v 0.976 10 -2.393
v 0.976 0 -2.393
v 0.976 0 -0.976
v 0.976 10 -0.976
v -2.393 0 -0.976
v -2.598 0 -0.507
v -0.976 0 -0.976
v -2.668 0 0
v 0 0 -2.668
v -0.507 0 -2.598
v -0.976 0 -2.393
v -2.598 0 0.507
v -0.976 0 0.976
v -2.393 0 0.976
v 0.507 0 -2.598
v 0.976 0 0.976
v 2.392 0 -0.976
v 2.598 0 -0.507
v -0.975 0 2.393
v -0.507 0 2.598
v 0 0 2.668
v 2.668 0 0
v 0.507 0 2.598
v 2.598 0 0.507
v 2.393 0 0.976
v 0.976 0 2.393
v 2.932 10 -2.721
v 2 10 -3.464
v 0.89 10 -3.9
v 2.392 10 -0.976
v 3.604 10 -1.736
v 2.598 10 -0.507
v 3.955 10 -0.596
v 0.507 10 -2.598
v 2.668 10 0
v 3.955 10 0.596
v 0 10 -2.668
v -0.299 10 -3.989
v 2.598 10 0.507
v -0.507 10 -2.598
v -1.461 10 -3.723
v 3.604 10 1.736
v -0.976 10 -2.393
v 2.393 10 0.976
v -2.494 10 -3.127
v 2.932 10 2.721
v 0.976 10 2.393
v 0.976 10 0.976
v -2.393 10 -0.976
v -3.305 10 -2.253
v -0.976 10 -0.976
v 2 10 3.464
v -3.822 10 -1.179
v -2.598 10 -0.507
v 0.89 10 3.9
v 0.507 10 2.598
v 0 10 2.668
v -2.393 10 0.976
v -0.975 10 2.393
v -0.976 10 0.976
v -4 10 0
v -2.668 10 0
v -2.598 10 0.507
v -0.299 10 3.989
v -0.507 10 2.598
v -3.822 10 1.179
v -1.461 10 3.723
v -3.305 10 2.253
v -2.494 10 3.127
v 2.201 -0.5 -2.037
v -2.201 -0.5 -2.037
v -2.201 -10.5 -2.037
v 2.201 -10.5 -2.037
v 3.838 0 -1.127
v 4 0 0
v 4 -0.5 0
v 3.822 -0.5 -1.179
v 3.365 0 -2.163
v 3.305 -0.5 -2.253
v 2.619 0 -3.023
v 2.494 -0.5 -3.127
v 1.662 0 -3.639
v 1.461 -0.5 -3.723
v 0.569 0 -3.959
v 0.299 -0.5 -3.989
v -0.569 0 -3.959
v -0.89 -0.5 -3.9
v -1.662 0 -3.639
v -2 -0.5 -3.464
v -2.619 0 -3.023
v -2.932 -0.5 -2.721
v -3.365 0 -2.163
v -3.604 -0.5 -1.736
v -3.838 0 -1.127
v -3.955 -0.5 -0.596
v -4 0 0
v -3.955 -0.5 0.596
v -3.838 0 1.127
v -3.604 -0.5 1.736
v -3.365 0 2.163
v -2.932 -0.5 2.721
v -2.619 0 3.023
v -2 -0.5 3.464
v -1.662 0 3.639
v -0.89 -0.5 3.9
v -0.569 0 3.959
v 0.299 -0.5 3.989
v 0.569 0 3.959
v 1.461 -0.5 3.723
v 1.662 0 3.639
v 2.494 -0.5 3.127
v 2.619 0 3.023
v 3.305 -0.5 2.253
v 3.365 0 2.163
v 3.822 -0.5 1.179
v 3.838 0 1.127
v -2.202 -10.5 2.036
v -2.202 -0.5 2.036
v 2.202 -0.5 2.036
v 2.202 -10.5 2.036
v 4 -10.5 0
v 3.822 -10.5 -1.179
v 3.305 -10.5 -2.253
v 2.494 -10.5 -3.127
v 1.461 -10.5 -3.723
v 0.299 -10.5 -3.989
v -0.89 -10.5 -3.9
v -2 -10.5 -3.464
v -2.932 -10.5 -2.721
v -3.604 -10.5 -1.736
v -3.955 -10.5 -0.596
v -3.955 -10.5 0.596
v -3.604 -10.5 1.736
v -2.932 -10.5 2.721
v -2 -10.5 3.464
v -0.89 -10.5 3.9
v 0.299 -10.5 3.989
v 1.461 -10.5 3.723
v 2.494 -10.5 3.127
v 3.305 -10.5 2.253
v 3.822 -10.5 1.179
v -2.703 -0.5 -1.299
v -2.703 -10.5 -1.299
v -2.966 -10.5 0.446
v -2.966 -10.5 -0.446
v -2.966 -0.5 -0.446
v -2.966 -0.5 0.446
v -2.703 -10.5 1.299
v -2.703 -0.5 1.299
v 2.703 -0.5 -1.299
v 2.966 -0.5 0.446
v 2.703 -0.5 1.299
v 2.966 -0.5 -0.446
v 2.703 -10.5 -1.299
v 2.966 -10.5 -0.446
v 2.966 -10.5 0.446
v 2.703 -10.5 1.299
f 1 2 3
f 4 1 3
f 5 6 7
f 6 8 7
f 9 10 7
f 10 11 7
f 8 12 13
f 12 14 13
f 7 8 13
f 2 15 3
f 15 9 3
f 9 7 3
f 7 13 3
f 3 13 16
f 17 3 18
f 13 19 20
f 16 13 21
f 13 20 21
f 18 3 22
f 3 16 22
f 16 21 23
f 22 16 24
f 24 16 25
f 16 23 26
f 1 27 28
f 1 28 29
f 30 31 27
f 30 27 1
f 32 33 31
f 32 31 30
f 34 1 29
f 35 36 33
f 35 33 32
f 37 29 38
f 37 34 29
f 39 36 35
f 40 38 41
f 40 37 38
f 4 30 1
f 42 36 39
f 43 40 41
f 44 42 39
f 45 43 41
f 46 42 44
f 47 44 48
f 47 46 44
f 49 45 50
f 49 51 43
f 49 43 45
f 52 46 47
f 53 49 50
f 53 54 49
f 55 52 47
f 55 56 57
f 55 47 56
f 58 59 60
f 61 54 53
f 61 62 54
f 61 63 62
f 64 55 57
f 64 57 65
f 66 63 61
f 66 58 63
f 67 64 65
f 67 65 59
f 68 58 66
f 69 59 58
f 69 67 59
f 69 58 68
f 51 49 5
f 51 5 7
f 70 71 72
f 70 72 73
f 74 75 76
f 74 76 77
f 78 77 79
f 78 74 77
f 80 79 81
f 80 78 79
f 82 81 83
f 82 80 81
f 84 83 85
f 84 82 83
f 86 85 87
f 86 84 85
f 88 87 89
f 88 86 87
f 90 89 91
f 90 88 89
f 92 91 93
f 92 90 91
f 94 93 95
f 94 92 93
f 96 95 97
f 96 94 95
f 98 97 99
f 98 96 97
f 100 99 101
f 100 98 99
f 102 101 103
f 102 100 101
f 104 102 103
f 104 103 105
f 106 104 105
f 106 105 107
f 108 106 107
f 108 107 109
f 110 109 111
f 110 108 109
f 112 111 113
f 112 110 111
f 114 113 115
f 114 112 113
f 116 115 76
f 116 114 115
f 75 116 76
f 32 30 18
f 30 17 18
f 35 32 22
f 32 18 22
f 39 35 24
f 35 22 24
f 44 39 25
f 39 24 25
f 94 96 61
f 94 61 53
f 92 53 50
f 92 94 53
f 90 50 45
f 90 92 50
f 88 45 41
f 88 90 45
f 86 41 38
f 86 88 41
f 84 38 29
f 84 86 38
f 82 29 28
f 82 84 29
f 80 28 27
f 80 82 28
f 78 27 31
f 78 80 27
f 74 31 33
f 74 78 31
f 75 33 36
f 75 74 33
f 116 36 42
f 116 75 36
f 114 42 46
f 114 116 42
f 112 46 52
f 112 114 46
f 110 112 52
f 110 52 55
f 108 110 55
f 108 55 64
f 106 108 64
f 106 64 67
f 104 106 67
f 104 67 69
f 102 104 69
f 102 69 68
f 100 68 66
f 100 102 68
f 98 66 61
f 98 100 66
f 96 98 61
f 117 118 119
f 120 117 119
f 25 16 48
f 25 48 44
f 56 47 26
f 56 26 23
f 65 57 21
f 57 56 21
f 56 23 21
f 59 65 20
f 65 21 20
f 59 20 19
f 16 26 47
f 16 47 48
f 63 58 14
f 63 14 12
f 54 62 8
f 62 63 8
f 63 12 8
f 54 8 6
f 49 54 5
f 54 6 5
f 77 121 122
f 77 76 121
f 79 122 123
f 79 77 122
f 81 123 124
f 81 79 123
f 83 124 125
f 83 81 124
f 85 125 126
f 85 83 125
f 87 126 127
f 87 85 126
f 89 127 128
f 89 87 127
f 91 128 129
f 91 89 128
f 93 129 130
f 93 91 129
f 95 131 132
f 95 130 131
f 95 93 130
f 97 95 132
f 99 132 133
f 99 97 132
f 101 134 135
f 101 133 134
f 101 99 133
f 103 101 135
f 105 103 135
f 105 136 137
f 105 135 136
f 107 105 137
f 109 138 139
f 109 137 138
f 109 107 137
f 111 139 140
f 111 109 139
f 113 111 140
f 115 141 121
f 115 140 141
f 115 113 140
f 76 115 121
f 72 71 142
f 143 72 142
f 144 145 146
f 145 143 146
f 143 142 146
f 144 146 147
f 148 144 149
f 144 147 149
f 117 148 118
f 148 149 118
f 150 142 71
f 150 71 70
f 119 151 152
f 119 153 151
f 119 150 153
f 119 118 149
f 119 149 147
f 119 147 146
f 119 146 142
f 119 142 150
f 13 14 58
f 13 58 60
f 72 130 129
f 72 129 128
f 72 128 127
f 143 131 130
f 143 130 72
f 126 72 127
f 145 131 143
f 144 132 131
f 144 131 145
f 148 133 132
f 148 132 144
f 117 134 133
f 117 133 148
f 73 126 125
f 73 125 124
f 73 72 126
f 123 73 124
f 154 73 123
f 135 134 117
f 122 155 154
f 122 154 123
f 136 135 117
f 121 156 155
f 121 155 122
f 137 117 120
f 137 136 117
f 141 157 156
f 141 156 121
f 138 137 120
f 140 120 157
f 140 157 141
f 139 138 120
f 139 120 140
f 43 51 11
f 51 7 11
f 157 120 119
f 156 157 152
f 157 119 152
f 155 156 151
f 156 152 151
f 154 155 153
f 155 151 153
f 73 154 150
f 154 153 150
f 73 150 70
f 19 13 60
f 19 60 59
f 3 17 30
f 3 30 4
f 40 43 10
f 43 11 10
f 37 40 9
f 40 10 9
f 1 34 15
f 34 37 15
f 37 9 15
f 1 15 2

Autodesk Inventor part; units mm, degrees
ref_plane "YZ Plane" through (0, 0, 0) normal (1, 0, 0) x (0, 1, 0)
ref_plane "XZ Plane" through (0, 0, 0) normal (0, 1, 0) x (-1, 0, 0)
ref_plane "XY Plane" through (0, 0, 0) normal (0, 0, 1) x (1, 0, 0)
sketch "Sketch3" plane through (0, 0, 0) normal (0, 1, 0) x (-1, 0, 0)
  line L0 (2.3926, -0.9756) -> (2.3926, 0.9756)
  line L1 (2.3926, 0.9756) -> (0.9755, 0.9755)
  line L2 (0.9755, 0.9755) -> (0.9754, 2.3926)
  line L3 (0.9754, 2.3926) -> (-0.9756, 2.3926)
  arc A0 (0.9754, 2.3926) -> (-0.9756, 2.3926) centre (0, 0.8054) ccw
  arc A1 (2.3926, -0.9756) -> (2.3926, 0.9756) centre (0.8054, 0) ccw
  line L4 (2.3926, -0.9756) -> (0.9755, -0.9756)
  line L5 (0.9755, -0.9756) -> (0.9756, -2.3926)
  line L6 (0.9756, -2.3926) -> (-0.9755, -2.3926)
  arc A2 (-0.9755, -2.3926) -> (0.9756, -2.3926) centre (0, -0.8054) ccw
  line L7 (-0.9756, 2.3926) -> (-0.9756, 0.9756)
  line L8 (-0.9755, -2.3926) -> (-0.9756, -0.9755)
  line L9 (-0.9756, 0.9756) -> (-2.3926, 0.9756)
  line L10 (-2.3926, 0.9756) -> (-2.3925, -0.9755)
  line L11 (-2.3925, -0.9755) -> (-0.9756, -0.9755)
  arc A3 (-2.3926, 0.9756) -> (-2.3925, -0.9755) centre (-0.8054, 0) ccw
  circle A4 centre (0, 0) radius 4
  dimension "d23" = 1.951
  dimension "d24" = 1.9511
  dimension "d25" = 0.9756
  dimension "d28" = 1.4171
  dimension "d29" = 1.417
  dimension "d30" = 2.5838
  dimension "d31" = 1.863
  dimension "d32" = 1.863
  dimension "d33" = 1.417
  dimension "d34" = 1.9511
  dimension "d35" = 1.863
  dimension "d36" = 1.417
  dimension "d37" = 2.5838
  dimension "d38" = 1.9511
  dimension "d39" = 1.863
  dimension "d40" = 2.3925
  dimension "d41" = 2.3925
  dimension "d42" = 1.417
  dimension "d43" = 1.417
  dimension "d44" = 8
extrude "Extrusion1" add sketch "Sketch3" along normal blind 10
sketch "Sketch4" plane through (0, 0, 0) normal (0, -1, 0) x (1, 0, 0)
  circle A0 centre (0, 0) radius 4
extrude "Extrusion2" add sketch "Sketch4" along normal blind 0.5
sketch "Sketch5" plane through (0, -0.5, 0) normal (0, -1, 0) x (1, 0, 0)
  circle A0 centre (0, 0) radius 2.999
  line L0 (-0.0001, 2.0364) -> (-2.2016, 2.0364)
  line L1 (-0.9754, 2.3926) -> (-0.9755, 0.9755) projected
  line L2 (-0.0001, 2.0364) -> (2.2016, 2.0364)
  line L3 (-0.0001, -2.0369) -> (-2.2012, -2.0369)
  line L4 (-0.9755, -0.9756) -> (-0.9756, -2.3926) projected
  line L5 (-0.0001, -2.0369) -> (2.2012, -2.0369)
  circle A1 centre (0, 0) radius 4
  dimension "d49" = 5.998
  dimension "d50" = 2.0364
  dimension "d51" = 2.0369
  dimension "d52" = 2.2015
  dimension "d53" = 2.2012
  dimension "d56" = 8
extrude "Extrusion3" add sketch "Sketch5" along normal blind 10 contours L2 L0 A0 | A0 L3 L5 | A1
properties part number "motor_adapt"
